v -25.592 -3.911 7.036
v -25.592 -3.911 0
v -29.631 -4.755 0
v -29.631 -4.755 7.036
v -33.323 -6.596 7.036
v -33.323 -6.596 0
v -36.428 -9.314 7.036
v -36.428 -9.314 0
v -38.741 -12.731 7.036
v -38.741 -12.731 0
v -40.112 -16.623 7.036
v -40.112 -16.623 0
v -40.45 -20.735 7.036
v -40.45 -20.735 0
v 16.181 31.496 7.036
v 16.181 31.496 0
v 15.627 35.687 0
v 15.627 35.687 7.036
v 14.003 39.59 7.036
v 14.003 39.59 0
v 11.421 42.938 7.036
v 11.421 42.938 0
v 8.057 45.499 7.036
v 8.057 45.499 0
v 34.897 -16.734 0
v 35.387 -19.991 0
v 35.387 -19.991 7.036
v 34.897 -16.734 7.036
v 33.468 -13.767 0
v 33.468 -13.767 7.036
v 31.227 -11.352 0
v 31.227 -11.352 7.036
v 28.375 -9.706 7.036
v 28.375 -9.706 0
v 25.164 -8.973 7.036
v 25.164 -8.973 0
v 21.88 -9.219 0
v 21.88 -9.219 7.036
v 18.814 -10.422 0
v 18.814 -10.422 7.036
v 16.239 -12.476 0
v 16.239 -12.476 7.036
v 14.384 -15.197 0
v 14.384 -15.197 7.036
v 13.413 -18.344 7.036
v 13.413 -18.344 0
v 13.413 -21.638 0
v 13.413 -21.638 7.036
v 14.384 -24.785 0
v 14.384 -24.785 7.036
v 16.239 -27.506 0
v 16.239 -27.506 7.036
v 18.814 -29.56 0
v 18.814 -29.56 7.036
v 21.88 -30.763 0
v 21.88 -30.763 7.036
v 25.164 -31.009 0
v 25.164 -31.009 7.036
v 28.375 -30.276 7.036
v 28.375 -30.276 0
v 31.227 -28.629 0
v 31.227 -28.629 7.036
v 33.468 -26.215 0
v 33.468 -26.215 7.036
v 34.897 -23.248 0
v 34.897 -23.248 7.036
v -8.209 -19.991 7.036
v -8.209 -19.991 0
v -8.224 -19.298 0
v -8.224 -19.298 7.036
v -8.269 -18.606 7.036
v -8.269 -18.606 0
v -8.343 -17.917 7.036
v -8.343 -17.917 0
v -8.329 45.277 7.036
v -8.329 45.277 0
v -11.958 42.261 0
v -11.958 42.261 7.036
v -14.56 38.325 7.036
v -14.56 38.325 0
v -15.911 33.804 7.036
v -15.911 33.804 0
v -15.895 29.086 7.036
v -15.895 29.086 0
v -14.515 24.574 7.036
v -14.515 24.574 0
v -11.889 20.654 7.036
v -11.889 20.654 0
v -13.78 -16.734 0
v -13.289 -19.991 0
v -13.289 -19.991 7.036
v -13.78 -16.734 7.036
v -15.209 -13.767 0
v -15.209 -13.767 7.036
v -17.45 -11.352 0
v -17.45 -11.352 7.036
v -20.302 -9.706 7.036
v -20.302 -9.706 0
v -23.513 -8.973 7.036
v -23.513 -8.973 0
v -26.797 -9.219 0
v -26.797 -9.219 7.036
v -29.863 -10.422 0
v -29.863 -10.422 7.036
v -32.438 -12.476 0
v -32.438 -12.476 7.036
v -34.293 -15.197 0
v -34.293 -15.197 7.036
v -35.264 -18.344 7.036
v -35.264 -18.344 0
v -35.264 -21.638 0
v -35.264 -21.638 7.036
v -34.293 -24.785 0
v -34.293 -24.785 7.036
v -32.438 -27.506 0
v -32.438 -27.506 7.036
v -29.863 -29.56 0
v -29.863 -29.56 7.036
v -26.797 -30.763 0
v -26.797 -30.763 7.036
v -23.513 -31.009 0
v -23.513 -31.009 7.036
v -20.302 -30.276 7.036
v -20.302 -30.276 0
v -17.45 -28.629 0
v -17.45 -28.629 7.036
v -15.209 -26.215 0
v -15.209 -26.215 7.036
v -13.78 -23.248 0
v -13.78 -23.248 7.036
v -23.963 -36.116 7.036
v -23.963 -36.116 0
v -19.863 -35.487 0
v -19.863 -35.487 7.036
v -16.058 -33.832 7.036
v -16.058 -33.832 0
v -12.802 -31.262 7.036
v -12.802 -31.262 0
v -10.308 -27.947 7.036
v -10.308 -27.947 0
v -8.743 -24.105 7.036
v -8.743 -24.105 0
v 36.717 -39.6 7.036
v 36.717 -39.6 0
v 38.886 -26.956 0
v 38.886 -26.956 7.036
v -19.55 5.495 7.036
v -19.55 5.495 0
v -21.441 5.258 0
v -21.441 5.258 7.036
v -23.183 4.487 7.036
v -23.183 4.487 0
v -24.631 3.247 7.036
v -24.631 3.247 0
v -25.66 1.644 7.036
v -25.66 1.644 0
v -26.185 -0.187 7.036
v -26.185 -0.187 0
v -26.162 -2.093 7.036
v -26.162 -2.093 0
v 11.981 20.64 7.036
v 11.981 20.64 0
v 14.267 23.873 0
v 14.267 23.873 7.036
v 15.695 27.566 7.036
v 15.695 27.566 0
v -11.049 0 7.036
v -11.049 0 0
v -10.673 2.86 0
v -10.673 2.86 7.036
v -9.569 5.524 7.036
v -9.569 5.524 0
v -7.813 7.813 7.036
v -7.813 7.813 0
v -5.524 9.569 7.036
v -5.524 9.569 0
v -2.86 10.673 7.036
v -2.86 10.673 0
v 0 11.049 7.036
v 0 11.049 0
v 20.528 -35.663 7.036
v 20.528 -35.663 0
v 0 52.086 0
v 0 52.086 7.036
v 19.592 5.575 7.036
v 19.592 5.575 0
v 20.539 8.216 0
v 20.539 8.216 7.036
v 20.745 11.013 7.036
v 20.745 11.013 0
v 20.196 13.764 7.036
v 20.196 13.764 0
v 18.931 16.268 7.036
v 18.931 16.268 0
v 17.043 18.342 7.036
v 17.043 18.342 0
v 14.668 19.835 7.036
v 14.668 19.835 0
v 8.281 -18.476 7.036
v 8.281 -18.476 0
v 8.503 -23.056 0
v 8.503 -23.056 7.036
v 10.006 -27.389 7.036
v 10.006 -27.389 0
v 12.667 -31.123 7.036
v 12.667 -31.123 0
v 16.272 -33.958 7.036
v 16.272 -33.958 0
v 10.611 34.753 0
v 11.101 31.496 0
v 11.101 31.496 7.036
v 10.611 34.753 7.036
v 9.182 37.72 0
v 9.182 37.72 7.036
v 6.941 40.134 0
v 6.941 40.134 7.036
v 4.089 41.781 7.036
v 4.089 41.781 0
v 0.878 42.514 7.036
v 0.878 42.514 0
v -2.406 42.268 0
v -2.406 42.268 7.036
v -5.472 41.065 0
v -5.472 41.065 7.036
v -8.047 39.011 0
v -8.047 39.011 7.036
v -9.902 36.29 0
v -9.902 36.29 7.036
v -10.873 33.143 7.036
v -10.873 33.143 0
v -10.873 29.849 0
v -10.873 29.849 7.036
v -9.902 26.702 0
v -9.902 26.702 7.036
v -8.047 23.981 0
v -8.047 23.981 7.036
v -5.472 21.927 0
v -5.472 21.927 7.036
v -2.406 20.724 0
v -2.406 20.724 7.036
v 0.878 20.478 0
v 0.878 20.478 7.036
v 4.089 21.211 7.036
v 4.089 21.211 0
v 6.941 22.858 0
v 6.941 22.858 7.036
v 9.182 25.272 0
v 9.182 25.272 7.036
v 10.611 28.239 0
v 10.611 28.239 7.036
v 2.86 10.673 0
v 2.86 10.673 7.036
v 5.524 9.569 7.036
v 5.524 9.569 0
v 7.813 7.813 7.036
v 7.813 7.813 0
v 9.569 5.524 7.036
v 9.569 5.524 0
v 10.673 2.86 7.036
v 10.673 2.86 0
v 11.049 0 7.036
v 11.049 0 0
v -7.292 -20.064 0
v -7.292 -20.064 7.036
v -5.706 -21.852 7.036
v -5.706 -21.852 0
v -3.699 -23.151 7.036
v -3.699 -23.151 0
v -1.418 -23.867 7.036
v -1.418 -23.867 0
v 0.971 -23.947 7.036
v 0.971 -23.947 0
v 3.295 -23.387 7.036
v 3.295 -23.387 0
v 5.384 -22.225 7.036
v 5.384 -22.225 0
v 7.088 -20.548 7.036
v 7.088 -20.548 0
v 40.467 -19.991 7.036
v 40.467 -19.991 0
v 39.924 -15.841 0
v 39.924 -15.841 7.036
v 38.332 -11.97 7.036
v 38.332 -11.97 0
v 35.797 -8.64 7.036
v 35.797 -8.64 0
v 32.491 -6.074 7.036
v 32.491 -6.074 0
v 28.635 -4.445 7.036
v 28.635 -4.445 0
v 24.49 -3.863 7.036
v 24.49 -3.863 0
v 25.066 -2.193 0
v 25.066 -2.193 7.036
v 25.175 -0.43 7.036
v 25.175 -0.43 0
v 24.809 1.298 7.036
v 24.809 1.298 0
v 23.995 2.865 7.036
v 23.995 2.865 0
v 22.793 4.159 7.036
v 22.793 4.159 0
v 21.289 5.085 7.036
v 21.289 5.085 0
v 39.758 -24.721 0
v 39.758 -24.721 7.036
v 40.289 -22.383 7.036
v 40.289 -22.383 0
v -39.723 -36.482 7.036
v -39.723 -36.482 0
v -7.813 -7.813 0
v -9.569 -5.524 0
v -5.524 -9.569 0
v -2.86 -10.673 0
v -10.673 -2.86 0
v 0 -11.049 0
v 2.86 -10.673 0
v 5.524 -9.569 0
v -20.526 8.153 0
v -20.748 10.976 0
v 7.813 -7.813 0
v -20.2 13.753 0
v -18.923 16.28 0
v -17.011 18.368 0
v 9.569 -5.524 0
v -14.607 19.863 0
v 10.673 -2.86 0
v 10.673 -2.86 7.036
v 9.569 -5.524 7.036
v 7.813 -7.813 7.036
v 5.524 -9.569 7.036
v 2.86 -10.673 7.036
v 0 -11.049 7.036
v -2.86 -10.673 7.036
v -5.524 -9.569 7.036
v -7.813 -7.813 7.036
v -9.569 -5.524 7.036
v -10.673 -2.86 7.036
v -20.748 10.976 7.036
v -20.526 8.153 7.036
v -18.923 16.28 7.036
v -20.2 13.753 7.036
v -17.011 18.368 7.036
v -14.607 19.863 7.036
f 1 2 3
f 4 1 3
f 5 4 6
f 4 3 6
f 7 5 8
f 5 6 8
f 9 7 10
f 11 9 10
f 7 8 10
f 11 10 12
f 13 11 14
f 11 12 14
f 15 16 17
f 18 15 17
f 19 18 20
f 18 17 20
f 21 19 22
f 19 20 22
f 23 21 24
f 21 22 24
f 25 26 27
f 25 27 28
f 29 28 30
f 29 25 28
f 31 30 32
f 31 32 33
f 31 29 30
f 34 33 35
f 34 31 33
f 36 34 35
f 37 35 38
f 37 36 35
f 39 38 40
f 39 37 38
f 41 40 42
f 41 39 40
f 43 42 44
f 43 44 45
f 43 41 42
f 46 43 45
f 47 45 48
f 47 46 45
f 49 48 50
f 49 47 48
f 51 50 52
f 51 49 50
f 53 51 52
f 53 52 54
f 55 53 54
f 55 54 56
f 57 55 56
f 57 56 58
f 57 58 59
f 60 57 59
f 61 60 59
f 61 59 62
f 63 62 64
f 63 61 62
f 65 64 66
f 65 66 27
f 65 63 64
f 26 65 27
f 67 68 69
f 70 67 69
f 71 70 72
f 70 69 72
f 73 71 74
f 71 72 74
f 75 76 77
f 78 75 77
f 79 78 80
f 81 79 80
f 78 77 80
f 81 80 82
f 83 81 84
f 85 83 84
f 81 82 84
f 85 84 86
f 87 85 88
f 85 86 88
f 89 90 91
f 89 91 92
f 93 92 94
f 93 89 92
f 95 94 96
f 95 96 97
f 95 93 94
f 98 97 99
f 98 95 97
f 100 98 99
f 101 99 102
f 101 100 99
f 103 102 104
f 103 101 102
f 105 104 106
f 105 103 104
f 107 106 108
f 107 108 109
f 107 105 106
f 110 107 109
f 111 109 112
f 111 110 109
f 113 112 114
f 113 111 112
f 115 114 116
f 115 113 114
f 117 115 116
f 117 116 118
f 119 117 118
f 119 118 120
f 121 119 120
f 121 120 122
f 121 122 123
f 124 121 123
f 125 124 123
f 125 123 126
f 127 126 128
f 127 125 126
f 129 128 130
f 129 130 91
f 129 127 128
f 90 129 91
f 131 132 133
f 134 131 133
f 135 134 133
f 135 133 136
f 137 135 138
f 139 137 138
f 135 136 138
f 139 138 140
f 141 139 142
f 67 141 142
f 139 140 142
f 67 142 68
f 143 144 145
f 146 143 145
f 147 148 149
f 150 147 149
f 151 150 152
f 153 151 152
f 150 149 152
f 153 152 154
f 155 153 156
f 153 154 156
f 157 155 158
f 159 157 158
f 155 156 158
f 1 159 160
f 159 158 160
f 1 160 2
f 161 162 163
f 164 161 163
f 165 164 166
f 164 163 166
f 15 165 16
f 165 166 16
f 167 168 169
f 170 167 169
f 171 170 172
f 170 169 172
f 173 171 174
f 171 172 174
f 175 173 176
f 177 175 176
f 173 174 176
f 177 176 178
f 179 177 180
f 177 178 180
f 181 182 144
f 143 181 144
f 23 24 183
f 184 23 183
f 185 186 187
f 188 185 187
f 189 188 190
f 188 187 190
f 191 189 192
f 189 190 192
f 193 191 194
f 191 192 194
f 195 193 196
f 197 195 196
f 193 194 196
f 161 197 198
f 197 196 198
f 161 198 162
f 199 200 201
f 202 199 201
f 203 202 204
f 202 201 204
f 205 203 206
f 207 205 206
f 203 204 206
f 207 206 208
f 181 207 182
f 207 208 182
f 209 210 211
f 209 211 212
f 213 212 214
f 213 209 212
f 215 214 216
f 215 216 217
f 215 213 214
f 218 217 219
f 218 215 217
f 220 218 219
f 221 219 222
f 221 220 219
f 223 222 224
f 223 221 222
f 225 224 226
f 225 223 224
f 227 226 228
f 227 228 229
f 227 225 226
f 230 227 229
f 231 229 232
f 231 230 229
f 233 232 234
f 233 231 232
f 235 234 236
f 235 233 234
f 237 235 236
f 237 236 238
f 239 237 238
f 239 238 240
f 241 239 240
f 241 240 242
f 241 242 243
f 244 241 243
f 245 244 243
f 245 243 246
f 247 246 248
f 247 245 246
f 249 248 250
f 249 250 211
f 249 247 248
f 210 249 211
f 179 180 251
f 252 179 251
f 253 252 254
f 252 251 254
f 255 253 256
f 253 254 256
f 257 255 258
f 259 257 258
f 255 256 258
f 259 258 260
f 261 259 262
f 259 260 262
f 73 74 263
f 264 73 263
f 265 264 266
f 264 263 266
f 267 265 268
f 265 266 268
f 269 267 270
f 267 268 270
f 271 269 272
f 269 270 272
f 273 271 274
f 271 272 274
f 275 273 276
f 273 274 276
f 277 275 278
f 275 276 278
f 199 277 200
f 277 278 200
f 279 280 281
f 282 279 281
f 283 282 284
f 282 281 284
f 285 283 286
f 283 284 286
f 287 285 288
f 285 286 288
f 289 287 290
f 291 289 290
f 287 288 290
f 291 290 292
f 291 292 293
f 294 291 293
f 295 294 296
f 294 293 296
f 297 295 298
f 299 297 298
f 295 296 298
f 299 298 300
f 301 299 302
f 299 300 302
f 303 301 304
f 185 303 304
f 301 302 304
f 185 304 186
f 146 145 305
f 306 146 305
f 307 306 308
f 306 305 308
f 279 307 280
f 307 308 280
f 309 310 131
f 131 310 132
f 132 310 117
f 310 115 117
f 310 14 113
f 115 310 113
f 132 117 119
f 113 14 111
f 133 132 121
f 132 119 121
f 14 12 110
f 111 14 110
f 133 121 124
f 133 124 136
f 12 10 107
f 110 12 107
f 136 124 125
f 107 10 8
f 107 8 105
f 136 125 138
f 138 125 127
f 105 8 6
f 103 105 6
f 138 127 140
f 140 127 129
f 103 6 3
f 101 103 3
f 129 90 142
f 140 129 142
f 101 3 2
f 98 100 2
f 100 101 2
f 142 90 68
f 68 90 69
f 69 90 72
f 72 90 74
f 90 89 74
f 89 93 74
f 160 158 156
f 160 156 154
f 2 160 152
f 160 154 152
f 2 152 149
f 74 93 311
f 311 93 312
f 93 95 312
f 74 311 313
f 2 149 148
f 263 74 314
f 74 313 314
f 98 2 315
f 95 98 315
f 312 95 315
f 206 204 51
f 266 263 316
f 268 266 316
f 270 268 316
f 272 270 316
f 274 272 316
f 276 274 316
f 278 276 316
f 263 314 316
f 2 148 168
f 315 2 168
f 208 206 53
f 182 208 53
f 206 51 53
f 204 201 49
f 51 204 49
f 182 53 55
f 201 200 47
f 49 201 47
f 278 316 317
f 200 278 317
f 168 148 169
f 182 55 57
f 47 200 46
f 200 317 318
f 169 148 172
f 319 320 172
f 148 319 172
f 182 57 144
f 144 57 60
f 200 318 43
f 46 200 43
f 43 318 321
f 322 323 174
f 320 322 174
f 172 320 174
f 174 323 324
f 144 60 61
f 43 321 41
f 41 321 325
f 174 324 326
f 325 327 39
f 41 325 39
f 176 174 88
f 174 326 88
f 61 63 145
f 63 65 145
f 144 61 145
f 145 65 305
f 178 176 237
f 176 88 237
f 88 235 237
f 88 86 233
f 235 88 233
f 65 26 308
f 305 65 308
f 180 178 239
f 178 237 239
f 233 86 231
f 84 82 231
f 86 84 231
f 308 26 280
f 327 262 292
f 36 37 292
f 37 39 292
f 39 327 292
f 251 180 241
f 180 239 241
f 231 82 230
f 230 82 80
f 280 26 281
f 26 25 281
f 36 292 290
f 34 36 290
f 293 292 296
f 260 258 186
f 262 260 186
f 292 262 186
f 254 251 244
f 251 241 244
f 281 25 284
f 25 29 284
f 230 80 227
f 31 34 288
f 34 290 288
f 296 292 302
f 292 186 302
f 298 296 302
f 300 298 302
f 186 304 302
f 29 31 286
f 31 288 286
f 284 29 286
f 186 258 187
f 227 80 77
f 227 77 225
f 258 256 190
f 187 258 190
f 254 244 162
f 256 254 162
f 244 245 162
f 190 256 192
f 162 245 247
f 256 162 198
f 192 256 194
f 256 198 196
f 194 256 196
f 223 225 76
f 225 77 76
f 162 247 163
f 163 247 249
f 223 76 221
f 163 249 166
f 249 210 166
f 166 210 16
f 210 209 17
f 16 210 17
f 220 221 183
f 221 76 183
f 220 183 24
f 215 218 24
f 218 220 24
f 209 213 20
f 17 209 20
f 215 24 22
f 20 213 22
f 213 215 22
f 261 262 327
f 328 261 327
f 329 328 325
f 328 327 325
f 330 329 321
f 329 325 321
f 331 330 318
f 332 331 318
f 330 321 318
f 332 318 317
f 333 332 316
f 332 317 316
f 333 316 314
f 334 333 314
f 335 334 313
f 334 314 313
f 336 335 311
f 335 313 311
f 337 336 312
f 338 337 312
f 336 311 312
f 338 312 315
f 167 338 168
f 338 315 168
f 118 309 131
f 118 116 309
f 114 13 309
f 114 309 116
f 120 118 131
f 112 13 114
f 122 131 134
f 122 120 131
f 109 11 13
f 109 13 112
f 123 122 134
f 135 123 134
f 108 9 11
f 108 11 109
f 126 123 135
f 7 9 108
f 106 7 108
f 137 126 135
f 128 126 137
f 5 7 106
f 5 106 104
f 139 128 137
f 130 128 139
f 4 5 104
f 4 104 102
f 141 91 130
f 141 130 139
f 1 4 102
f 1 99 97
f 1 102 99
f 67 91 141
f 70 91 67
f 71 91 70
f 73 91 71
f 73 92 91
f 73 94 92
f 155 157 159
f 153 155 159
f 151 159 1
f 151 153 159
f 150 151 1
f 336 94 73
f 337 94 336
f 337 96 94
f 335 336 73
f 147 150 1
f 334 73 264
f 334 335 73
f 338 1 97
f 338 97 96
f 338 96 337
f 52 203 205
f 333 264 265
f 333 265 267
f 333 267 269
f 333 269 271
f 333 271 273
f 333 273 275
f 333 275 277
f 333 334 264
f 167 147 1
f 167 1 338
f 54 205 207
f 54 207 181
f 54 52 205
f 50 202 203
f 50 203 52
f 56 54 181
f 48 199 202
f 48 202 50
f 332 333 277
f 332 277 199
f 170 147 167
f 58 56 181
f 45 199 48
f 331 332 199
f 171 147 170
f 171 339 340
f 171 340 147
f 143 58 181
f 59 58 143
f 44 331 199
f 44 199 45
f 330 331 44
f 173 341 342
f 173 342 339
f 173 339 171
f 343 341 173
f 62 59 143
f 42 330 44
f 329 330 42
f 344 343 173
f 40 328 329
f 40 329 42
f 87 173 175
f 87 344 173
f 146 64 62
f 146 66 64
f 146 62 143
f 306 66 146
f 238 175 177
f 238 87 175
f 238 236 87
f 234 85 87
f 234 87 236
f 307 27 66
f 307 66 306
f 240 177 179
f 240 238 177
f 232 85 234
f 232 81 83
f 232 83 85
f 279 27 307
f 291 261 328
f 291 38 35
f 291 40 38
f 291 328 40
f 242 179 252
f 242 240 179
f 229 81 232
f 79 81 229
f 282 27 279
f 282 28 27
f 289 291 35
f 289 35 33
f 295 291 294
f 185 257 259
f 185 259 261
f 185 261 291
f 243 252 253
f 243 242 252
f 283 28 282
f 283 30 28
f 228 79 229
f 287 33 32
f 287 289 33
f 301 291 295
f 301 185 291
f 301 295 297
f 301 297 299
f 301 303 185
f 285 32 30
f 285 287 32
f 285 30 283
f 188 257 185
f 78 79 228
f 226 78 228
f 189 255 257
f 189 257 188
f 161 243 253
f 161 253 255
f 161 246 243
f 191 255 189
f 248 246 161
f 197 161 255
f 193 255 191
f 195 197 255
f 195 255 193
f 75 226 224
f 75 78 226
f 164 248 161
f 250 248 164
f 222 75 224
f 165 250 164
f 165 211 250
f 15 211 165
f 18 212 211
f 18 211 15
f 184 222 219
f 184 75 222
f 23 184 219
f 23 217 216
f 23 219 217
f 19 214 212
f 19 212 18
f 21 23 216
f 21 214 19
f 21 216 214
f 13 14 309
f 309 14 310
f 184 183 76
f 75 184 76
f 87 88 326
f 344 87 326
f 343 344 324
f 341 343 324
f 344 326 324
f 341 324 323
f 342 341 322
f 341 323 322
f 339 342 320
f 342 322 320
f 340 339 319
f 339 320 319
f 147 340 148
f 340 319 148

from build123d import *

# Parameters (mm, degrees)
F0_R     = 11.049
F1_DEPTH = 7.0358


with BuildPart() as f1:
    # F0 (on Top) → F1 (new body)
    with BuildSketch(Plane.XY):
        with BuildLine():
            ThreePointArc((15.3606223584, -6.5915638429), (14.0515764921, -2.7419023957), (11.049, 0))
            ThreePointArc((11.049, 0), (7.8128228253, -7.8128228253), (0, -11.049))
            ThreePointArc((0, -11.049), (3.7722273632, -14.6239373815), (8.9372329685, -15.2006467181))
            ThreePointArc((8.9372329685, -15.2006467181), (11.4112106852, -10.3456815617), (15.3606223584, -6.5915638429))
        make_face()
        with BuildLine():
            ThreePointArc((0, 11.049), (7.8128228253, 7.8128228253), (11.049, 0))
            ThreePointArc((11.049, 0), (16.0517409884, 1.6673539034), (19.5923287649, 5.5752593056))
            ThreePointArc((19.5923287649, 5.5752593056), (19.648285181, 15.0586380241), (11.9809254143, 20.639784613))
            ThreePointArc((11.9809254143, 20.639784613), (7.1318081537, 17.0036295078), (1.2830021666, 15.4139658073))
            ThreePointArc((1.2830021666, 15.4139658073), (0.3997348377, 13.3025456864), (0, 11.049))
        make_face()
        with BuildLine():
            ThreePointArc((19.5923287649, 5.5752593056), (16.0517409884, 1.6673539034), (11.049, 0))
            ThreePointArc((11.049, 0), (14.0515764921, -2.7419023957), (15.3606223584, -6.5915638429))
            ThreePointArc((15.3606223584, -6.5915638429), (19.7194060635, -4.5374863882), (24.4904460645, -3.8626479736))
            ThreePointArc((24.4904460645, -3.8626479736), (24.4551845175, 2.1090263166), (19.5923287649, 5.5752593056))
        make_face()
        with BuildLine():
            ThreePointArc((-1.2878785477, 15.4227450117), (-0.401152017, 13.3073628417), (0, 11.049))
            ThreePointArc((0, 11.049), (0.3997348377, 13.3025456864), (1.2830021666, 15.4139658073))
            ThreePointArc((1.2830021666, 15.4139658073), (-0.0026133903, 15.367050345), (-1.2878785477, 15.4227450117))
        make_face()
        with BuildLine():
            ThreePointArc((-11.049, 0), (-7.8128228253, 7.8128228253), (0, 11.049))
            ThreePointArc((0, 11.049), (-0.401152017, 13.3073628417), (-1.2878785477, 15.4227450117))
            ThreePointArc((-1.2878785477, 15.4227450117), (-7.0848261597, 17.032079869), (-11.8887450472, 20.6538092378))
            ThreePointArc((-11.8887450472, 20.6538092378), (-19.6475824124, 15.060028688), (-19.5503933089, 5.4954851872))
            ThreePointArc((-19.5503933089, 5.4954851872), (-16.0139499505, 1.6428086369), (-11.049, 0))
        make_face()
        with BuildLine():
            ThreePointArc((-8.7698737274, -15.7762258045), (-3.5991350923, -14.870419784), (0, -11.049))
            ThreePointArc((0, -11.049), (-7.8128228253, -7.8128228253), (-11.049, 0))
            ThreePointArc((-11.049, 0), (-14.2101099006, -2.5648530064), (-15.7760277941, -6.3223771779))
            ThreePointArc((-15.7760277941, -6.3223771779), (-11.380052467, -10.3875833636), (-8.7698737274, -15.7762258045))
        make_face()
        with BuildLine():
            ThreePointArc((8.9372329685, -15.2006467181), (3.7722273632, -14.6239373815), (0, -11.049))
            ThreePointArc((0, -11.049), (-3.5991350923, -14.870419784), (-8.7698737274, -15.7762258045))
            ThreePointArc((-8.7698737274, -15.7762258045), (-8.5203506621, -16.839417556), (-8.3433460468, -17.9170574897))
            ThreePointArc((-8.3433460468, -17.9170574897), (-0.2261466235, -23.9881077254), (8.2807318523, -18.4763388586))
            ThreePointArc((8.2807318523, -18.4763388586), (8.523941199, -16.8214491689), (8.9372329685, -15.2006467181))
        make_face()
        with BuildLine():
            ThreePointArc((8.9372329685, -15.2006467181), (13.7625460617, -12.1000545802), (15.3606223584, -6.5915638429))
            ThreePointArc((15.3606223584, -6.5915638429), (11.4112106852, -10.3456815617), (8.9372329685, -15.2006467181))
        make_face()
        with BuildLine():
            ThreePointArc((24.4904460645, -3.8626479736), (20.5132557556, -7.1933790888), (15.3606223584, -6.5915638429))
            ThreePointArc((15.3606223584, -6.5915638429), (13.7625460617, -12.1000545802), (8.9372329685, -15.2006467181))
            ThreePointArc((8.9372329685, -15.2006467181), (8.7646746362, -16.8696960014), (8.2807318523, -18.4763388586))
            ThreePointArc((8.2807318523, -18.4763388586), (11.2032111335, -29.3509460419), (20.5279860839, -35.6633575195))
            ThreePointArc((20.5279860839, -35.6633575195), (31.2506997753, -34.5637006191), (38.8862682367, -26.9555517986))
            ThreePointArc((38.8862682367, -26.9555517986), (40.0671958518, -23.5618596089), (40.4674604904, -19.9909318682))
            ThreePointArc((40.4674604904, -19.9909318682), (35.7969947842, -8.6398687974), (24.4904460645, -3.8626479736))
        make_face()
        with Locations((24.3384604904, -19.9909318682)):
            Circle(F0_R, mode=Mode.SUBTRACT)
        with BuildLine():
            ThreePointArc((24.4904460645, -3.8626479736), (19.7194060635, -4.5374863882), (15.3606223584, -6.5915638429))
            ThreePointArc((15.3606223584, -6.5915638429), (20.5132557556, -7.1933790888), (24.4904460645, -3.8626479736))
        make_face()
        with BuildLine():
            ThreePointArc((-15.7760277941, -6.3223771779), (-14.2101099006, -2.5648530064), (-11.049, 0))
            ThreePointArc((-11.049, 0), (-16.0139499505, 1.6428086369), (-19.5503933089, 5.4954851872))
            ThreePointArc((-19.5503933089, 5.4954851872), (-25.2039351491, 2.4834340402), (-25.5915562379, -3.9106833611))
            ThreePointArc((-25.5915562379, -3.9106833611), (-20.4899973654, -4.3277912963), (-15.7760277941, -6.3223771779))
        make_face()
        with BuildLine():
            ThreePointArc((2.1504403371, 16.730865023), (1.6917102547, 16.0888900954), (1.2830021666, 15.4139658073))
            ThreePointArc((1.2830021666, 15.4139658073), (7.1318081537, 17.0036295078), (11.9809254143, 20.639784613))
            ThreePointArc((11.9809254143, 20.639784613), (6.5311461577, 20.0296234429), (2.1504403371, 16.730865023))
        make_face()
        with BuildLine():
            ThreePointArc((-1.2878785477, 15.4227450117), (-0.0026133903, 15.367050345), (1.2830021666, 15.4139658073))
            ThreePointArc((1.2830021666, 15.4139658073), (1.6917102547, 16.0888900954), (2.1504403371, 16.730865023))
            ThreePointArc((2.1504403371, 16.730865023), (-0.0310099814, 18.9779969426), (-2.0205494764, 16.5593072242))
            ThreePointArc((-2.0205494764, 16.5593072242), (-1.6357105315, 16.0029541604), (-1.2878785477, 15.4227450117))
        make_face()
        with BuildLine():
            ThreePointArc((-11.8887450472, 20.6538092378), (-7.0848261597, 17.032079869), (-1.2878785477, 15.4227450117))
            ThreePointArc((-1.2878785477, 15.4227450117), (-1.6357105315, 16.0029541604), (-2.0205494764, 16.5593072242))
            ThreePointArc((-2.0205494764, 16.5593072242), (-6.3882732082, 19.9715813543), (-11.8887450472, 20.6538092378))
        make_face()
        with BuildLine():
            ThreePointArc((8.2807318523, -18.4763388586), (8.7646746362, -16.8696960014), (8.9372329685, -15.2006467181))
            ThreePointArc((8.9372329685, -15.2006467181), (8.523941199, -16.8214491689), (8.2807318523, -18.4763388586))
        make_face()
        with BuildLine():
            ThreePointArc((-15.7760277941, -6.3223771779), (-14.2311309419, -12.5004895292), (-8.7698737274, -15.7762258045))
            ThreePointArc((-8.7698737274, -15.7762258045), (-11.380052467, -10.3875833636), (-15.7760277941, -6.3223771779))
        make_face()
        with BuildLine():
            ThreePointArc((-8.3433460468, -17.9170574897), (-8.6227516064, -16.8598193641), (-8.7698737274, -15.7762258045))
            ThreePointArc((-8.7698737274, -15.7762258045), (-14.2311309419, -12.5004895292), (-15.7760277941, -6.3223771779))
            ThreePointArc((-15.7760277941, -6.3223771779), (-21.2515182716, -7.4271607367), (-25.5915562379, -3.9106833611))
            ThreePointArc((-25.5915562379, -3.9106833611), (-36.4277245579, -9.3141188931), (-40.450284213, -20.7350940367))
            ThreePointArc((-40.450284213, -20.7350940367), (-35.3407505097, -31.7847546298), (-23.963299648, -36.1155681538))
            ThreePointArc((-23.963299648, -36.1155681538), (-12.8016582856, -31.2624373527), (-8.2094604904, -19.9909318682))
            ThreePointArc((-8.2094604904, -19.9909318682), (-8.2429666822, -18.9518360737), (-8.3433460468, -17.9170574897))
        make_face()
        with Locations((-24.3384604904, -19.9909318682)):
            Circle(F0_R, mode=Mode.SUBTRACT)
        with BuildLine():
            ThreePointArc((-8.3433460468, -17.9170574897), (-8.5203506621, -16.839417556), (-8.7698737274, -15.7762258045))
            ThreePointArc((-8.7698737274, -15.7762258045), (-8.6227516064, -16.8598193641), (-8.3433460468, -17.9170574897))
        make_face()
        with BuildLine():
            ThreePointArc((2.1504403371, 16.730865023), (6.5311461577, 20.0296234429), (11.9809254143, 20.639784613))
            ThreePointArc((11.9809254143, 20.639784613), (15.0947181843, 25.6757116075), (16.1814646071, 31.4959563034))
            ThreePointArc((16.1814646071, 31.4959563034), (14.0032432118, 39.5904246198), (8.0569166098, 45.4985770987))
            ThreePointArc((8.0569166098, 45.4985770987), (-0.1661064271, 47.6234752602), (-8.3285237566, 45.2765105392))
            ThreePointArc((-8.3285237566, 45.2765105392), (-15.9105328531, 33.804062255), (-11.8887450472, 20.6538092378))
            ThreePointArc((-11.8887450472, 20.6538092378), (-6.3882732082, 19.9715813543), (-2.0205494764, 16.5593072242))
            ThreePointArc((-2.0205494764, 16.5593072242), (-0.0310099814, 18.9779969426), (2.1504403371, 16.730865023))
        make_face()
        with Locations((0.0524646071, 31.4959563034)):
            Circle(F0_R, mode=Mode.SUBTRACT)
        with BuildLine():
            ThreePointArc((-25.5915562379, -3.9106833611), (-21.2515182716, -7.4271607367), (-15.7760277941, -6.3223771779))
            ThreePointArc((-15.7760277941, -6.3223771779), (-20.4899973654, -4.3277912963), (-25.5915562379, -3.9106833611))
        make_face()
        with BuildLine():
            Line((0, 52.0859286189), (-8.3285237566, 45.2765105392))
            ThreePointArc((-8.3285237566, 45.2765105392), (-0.1661064271, 47.6234752602), (8.0569166098, 45.4985770987))
            Line((8.0569166098, 45.4985770987), (0, 52.0859286189))
        make_face()
        with BuildLine():
            ThreePointArc((38.8862682367, -26.9555517986), (31.2506997753, -34.5637006191), (20.5279860839, -35.6633575195))
            Line((20.5279860839, -35.6633575195), (36.7174671022, -39.5995448364))
            Line((36.7174671022, -39.5995448364), (38.8862682367, -26.9555517986))
        make_face()
        with BuildLine():
            ThreePointArc((-23.963299648, -36.1155681538), (-35.3407505097, -31.7847546298), (-40.450284213, -20.7350940367))
            Line((-40.450284213, -20.7350940367), (-39.7229656538, -36.4822374832))
            Line((-39.7229656538, -36.4822374832), (-23.963299648, -36.1155681538))
        make_face()
    extrude(amount=F1_DEPTH)


solid = f1.part
